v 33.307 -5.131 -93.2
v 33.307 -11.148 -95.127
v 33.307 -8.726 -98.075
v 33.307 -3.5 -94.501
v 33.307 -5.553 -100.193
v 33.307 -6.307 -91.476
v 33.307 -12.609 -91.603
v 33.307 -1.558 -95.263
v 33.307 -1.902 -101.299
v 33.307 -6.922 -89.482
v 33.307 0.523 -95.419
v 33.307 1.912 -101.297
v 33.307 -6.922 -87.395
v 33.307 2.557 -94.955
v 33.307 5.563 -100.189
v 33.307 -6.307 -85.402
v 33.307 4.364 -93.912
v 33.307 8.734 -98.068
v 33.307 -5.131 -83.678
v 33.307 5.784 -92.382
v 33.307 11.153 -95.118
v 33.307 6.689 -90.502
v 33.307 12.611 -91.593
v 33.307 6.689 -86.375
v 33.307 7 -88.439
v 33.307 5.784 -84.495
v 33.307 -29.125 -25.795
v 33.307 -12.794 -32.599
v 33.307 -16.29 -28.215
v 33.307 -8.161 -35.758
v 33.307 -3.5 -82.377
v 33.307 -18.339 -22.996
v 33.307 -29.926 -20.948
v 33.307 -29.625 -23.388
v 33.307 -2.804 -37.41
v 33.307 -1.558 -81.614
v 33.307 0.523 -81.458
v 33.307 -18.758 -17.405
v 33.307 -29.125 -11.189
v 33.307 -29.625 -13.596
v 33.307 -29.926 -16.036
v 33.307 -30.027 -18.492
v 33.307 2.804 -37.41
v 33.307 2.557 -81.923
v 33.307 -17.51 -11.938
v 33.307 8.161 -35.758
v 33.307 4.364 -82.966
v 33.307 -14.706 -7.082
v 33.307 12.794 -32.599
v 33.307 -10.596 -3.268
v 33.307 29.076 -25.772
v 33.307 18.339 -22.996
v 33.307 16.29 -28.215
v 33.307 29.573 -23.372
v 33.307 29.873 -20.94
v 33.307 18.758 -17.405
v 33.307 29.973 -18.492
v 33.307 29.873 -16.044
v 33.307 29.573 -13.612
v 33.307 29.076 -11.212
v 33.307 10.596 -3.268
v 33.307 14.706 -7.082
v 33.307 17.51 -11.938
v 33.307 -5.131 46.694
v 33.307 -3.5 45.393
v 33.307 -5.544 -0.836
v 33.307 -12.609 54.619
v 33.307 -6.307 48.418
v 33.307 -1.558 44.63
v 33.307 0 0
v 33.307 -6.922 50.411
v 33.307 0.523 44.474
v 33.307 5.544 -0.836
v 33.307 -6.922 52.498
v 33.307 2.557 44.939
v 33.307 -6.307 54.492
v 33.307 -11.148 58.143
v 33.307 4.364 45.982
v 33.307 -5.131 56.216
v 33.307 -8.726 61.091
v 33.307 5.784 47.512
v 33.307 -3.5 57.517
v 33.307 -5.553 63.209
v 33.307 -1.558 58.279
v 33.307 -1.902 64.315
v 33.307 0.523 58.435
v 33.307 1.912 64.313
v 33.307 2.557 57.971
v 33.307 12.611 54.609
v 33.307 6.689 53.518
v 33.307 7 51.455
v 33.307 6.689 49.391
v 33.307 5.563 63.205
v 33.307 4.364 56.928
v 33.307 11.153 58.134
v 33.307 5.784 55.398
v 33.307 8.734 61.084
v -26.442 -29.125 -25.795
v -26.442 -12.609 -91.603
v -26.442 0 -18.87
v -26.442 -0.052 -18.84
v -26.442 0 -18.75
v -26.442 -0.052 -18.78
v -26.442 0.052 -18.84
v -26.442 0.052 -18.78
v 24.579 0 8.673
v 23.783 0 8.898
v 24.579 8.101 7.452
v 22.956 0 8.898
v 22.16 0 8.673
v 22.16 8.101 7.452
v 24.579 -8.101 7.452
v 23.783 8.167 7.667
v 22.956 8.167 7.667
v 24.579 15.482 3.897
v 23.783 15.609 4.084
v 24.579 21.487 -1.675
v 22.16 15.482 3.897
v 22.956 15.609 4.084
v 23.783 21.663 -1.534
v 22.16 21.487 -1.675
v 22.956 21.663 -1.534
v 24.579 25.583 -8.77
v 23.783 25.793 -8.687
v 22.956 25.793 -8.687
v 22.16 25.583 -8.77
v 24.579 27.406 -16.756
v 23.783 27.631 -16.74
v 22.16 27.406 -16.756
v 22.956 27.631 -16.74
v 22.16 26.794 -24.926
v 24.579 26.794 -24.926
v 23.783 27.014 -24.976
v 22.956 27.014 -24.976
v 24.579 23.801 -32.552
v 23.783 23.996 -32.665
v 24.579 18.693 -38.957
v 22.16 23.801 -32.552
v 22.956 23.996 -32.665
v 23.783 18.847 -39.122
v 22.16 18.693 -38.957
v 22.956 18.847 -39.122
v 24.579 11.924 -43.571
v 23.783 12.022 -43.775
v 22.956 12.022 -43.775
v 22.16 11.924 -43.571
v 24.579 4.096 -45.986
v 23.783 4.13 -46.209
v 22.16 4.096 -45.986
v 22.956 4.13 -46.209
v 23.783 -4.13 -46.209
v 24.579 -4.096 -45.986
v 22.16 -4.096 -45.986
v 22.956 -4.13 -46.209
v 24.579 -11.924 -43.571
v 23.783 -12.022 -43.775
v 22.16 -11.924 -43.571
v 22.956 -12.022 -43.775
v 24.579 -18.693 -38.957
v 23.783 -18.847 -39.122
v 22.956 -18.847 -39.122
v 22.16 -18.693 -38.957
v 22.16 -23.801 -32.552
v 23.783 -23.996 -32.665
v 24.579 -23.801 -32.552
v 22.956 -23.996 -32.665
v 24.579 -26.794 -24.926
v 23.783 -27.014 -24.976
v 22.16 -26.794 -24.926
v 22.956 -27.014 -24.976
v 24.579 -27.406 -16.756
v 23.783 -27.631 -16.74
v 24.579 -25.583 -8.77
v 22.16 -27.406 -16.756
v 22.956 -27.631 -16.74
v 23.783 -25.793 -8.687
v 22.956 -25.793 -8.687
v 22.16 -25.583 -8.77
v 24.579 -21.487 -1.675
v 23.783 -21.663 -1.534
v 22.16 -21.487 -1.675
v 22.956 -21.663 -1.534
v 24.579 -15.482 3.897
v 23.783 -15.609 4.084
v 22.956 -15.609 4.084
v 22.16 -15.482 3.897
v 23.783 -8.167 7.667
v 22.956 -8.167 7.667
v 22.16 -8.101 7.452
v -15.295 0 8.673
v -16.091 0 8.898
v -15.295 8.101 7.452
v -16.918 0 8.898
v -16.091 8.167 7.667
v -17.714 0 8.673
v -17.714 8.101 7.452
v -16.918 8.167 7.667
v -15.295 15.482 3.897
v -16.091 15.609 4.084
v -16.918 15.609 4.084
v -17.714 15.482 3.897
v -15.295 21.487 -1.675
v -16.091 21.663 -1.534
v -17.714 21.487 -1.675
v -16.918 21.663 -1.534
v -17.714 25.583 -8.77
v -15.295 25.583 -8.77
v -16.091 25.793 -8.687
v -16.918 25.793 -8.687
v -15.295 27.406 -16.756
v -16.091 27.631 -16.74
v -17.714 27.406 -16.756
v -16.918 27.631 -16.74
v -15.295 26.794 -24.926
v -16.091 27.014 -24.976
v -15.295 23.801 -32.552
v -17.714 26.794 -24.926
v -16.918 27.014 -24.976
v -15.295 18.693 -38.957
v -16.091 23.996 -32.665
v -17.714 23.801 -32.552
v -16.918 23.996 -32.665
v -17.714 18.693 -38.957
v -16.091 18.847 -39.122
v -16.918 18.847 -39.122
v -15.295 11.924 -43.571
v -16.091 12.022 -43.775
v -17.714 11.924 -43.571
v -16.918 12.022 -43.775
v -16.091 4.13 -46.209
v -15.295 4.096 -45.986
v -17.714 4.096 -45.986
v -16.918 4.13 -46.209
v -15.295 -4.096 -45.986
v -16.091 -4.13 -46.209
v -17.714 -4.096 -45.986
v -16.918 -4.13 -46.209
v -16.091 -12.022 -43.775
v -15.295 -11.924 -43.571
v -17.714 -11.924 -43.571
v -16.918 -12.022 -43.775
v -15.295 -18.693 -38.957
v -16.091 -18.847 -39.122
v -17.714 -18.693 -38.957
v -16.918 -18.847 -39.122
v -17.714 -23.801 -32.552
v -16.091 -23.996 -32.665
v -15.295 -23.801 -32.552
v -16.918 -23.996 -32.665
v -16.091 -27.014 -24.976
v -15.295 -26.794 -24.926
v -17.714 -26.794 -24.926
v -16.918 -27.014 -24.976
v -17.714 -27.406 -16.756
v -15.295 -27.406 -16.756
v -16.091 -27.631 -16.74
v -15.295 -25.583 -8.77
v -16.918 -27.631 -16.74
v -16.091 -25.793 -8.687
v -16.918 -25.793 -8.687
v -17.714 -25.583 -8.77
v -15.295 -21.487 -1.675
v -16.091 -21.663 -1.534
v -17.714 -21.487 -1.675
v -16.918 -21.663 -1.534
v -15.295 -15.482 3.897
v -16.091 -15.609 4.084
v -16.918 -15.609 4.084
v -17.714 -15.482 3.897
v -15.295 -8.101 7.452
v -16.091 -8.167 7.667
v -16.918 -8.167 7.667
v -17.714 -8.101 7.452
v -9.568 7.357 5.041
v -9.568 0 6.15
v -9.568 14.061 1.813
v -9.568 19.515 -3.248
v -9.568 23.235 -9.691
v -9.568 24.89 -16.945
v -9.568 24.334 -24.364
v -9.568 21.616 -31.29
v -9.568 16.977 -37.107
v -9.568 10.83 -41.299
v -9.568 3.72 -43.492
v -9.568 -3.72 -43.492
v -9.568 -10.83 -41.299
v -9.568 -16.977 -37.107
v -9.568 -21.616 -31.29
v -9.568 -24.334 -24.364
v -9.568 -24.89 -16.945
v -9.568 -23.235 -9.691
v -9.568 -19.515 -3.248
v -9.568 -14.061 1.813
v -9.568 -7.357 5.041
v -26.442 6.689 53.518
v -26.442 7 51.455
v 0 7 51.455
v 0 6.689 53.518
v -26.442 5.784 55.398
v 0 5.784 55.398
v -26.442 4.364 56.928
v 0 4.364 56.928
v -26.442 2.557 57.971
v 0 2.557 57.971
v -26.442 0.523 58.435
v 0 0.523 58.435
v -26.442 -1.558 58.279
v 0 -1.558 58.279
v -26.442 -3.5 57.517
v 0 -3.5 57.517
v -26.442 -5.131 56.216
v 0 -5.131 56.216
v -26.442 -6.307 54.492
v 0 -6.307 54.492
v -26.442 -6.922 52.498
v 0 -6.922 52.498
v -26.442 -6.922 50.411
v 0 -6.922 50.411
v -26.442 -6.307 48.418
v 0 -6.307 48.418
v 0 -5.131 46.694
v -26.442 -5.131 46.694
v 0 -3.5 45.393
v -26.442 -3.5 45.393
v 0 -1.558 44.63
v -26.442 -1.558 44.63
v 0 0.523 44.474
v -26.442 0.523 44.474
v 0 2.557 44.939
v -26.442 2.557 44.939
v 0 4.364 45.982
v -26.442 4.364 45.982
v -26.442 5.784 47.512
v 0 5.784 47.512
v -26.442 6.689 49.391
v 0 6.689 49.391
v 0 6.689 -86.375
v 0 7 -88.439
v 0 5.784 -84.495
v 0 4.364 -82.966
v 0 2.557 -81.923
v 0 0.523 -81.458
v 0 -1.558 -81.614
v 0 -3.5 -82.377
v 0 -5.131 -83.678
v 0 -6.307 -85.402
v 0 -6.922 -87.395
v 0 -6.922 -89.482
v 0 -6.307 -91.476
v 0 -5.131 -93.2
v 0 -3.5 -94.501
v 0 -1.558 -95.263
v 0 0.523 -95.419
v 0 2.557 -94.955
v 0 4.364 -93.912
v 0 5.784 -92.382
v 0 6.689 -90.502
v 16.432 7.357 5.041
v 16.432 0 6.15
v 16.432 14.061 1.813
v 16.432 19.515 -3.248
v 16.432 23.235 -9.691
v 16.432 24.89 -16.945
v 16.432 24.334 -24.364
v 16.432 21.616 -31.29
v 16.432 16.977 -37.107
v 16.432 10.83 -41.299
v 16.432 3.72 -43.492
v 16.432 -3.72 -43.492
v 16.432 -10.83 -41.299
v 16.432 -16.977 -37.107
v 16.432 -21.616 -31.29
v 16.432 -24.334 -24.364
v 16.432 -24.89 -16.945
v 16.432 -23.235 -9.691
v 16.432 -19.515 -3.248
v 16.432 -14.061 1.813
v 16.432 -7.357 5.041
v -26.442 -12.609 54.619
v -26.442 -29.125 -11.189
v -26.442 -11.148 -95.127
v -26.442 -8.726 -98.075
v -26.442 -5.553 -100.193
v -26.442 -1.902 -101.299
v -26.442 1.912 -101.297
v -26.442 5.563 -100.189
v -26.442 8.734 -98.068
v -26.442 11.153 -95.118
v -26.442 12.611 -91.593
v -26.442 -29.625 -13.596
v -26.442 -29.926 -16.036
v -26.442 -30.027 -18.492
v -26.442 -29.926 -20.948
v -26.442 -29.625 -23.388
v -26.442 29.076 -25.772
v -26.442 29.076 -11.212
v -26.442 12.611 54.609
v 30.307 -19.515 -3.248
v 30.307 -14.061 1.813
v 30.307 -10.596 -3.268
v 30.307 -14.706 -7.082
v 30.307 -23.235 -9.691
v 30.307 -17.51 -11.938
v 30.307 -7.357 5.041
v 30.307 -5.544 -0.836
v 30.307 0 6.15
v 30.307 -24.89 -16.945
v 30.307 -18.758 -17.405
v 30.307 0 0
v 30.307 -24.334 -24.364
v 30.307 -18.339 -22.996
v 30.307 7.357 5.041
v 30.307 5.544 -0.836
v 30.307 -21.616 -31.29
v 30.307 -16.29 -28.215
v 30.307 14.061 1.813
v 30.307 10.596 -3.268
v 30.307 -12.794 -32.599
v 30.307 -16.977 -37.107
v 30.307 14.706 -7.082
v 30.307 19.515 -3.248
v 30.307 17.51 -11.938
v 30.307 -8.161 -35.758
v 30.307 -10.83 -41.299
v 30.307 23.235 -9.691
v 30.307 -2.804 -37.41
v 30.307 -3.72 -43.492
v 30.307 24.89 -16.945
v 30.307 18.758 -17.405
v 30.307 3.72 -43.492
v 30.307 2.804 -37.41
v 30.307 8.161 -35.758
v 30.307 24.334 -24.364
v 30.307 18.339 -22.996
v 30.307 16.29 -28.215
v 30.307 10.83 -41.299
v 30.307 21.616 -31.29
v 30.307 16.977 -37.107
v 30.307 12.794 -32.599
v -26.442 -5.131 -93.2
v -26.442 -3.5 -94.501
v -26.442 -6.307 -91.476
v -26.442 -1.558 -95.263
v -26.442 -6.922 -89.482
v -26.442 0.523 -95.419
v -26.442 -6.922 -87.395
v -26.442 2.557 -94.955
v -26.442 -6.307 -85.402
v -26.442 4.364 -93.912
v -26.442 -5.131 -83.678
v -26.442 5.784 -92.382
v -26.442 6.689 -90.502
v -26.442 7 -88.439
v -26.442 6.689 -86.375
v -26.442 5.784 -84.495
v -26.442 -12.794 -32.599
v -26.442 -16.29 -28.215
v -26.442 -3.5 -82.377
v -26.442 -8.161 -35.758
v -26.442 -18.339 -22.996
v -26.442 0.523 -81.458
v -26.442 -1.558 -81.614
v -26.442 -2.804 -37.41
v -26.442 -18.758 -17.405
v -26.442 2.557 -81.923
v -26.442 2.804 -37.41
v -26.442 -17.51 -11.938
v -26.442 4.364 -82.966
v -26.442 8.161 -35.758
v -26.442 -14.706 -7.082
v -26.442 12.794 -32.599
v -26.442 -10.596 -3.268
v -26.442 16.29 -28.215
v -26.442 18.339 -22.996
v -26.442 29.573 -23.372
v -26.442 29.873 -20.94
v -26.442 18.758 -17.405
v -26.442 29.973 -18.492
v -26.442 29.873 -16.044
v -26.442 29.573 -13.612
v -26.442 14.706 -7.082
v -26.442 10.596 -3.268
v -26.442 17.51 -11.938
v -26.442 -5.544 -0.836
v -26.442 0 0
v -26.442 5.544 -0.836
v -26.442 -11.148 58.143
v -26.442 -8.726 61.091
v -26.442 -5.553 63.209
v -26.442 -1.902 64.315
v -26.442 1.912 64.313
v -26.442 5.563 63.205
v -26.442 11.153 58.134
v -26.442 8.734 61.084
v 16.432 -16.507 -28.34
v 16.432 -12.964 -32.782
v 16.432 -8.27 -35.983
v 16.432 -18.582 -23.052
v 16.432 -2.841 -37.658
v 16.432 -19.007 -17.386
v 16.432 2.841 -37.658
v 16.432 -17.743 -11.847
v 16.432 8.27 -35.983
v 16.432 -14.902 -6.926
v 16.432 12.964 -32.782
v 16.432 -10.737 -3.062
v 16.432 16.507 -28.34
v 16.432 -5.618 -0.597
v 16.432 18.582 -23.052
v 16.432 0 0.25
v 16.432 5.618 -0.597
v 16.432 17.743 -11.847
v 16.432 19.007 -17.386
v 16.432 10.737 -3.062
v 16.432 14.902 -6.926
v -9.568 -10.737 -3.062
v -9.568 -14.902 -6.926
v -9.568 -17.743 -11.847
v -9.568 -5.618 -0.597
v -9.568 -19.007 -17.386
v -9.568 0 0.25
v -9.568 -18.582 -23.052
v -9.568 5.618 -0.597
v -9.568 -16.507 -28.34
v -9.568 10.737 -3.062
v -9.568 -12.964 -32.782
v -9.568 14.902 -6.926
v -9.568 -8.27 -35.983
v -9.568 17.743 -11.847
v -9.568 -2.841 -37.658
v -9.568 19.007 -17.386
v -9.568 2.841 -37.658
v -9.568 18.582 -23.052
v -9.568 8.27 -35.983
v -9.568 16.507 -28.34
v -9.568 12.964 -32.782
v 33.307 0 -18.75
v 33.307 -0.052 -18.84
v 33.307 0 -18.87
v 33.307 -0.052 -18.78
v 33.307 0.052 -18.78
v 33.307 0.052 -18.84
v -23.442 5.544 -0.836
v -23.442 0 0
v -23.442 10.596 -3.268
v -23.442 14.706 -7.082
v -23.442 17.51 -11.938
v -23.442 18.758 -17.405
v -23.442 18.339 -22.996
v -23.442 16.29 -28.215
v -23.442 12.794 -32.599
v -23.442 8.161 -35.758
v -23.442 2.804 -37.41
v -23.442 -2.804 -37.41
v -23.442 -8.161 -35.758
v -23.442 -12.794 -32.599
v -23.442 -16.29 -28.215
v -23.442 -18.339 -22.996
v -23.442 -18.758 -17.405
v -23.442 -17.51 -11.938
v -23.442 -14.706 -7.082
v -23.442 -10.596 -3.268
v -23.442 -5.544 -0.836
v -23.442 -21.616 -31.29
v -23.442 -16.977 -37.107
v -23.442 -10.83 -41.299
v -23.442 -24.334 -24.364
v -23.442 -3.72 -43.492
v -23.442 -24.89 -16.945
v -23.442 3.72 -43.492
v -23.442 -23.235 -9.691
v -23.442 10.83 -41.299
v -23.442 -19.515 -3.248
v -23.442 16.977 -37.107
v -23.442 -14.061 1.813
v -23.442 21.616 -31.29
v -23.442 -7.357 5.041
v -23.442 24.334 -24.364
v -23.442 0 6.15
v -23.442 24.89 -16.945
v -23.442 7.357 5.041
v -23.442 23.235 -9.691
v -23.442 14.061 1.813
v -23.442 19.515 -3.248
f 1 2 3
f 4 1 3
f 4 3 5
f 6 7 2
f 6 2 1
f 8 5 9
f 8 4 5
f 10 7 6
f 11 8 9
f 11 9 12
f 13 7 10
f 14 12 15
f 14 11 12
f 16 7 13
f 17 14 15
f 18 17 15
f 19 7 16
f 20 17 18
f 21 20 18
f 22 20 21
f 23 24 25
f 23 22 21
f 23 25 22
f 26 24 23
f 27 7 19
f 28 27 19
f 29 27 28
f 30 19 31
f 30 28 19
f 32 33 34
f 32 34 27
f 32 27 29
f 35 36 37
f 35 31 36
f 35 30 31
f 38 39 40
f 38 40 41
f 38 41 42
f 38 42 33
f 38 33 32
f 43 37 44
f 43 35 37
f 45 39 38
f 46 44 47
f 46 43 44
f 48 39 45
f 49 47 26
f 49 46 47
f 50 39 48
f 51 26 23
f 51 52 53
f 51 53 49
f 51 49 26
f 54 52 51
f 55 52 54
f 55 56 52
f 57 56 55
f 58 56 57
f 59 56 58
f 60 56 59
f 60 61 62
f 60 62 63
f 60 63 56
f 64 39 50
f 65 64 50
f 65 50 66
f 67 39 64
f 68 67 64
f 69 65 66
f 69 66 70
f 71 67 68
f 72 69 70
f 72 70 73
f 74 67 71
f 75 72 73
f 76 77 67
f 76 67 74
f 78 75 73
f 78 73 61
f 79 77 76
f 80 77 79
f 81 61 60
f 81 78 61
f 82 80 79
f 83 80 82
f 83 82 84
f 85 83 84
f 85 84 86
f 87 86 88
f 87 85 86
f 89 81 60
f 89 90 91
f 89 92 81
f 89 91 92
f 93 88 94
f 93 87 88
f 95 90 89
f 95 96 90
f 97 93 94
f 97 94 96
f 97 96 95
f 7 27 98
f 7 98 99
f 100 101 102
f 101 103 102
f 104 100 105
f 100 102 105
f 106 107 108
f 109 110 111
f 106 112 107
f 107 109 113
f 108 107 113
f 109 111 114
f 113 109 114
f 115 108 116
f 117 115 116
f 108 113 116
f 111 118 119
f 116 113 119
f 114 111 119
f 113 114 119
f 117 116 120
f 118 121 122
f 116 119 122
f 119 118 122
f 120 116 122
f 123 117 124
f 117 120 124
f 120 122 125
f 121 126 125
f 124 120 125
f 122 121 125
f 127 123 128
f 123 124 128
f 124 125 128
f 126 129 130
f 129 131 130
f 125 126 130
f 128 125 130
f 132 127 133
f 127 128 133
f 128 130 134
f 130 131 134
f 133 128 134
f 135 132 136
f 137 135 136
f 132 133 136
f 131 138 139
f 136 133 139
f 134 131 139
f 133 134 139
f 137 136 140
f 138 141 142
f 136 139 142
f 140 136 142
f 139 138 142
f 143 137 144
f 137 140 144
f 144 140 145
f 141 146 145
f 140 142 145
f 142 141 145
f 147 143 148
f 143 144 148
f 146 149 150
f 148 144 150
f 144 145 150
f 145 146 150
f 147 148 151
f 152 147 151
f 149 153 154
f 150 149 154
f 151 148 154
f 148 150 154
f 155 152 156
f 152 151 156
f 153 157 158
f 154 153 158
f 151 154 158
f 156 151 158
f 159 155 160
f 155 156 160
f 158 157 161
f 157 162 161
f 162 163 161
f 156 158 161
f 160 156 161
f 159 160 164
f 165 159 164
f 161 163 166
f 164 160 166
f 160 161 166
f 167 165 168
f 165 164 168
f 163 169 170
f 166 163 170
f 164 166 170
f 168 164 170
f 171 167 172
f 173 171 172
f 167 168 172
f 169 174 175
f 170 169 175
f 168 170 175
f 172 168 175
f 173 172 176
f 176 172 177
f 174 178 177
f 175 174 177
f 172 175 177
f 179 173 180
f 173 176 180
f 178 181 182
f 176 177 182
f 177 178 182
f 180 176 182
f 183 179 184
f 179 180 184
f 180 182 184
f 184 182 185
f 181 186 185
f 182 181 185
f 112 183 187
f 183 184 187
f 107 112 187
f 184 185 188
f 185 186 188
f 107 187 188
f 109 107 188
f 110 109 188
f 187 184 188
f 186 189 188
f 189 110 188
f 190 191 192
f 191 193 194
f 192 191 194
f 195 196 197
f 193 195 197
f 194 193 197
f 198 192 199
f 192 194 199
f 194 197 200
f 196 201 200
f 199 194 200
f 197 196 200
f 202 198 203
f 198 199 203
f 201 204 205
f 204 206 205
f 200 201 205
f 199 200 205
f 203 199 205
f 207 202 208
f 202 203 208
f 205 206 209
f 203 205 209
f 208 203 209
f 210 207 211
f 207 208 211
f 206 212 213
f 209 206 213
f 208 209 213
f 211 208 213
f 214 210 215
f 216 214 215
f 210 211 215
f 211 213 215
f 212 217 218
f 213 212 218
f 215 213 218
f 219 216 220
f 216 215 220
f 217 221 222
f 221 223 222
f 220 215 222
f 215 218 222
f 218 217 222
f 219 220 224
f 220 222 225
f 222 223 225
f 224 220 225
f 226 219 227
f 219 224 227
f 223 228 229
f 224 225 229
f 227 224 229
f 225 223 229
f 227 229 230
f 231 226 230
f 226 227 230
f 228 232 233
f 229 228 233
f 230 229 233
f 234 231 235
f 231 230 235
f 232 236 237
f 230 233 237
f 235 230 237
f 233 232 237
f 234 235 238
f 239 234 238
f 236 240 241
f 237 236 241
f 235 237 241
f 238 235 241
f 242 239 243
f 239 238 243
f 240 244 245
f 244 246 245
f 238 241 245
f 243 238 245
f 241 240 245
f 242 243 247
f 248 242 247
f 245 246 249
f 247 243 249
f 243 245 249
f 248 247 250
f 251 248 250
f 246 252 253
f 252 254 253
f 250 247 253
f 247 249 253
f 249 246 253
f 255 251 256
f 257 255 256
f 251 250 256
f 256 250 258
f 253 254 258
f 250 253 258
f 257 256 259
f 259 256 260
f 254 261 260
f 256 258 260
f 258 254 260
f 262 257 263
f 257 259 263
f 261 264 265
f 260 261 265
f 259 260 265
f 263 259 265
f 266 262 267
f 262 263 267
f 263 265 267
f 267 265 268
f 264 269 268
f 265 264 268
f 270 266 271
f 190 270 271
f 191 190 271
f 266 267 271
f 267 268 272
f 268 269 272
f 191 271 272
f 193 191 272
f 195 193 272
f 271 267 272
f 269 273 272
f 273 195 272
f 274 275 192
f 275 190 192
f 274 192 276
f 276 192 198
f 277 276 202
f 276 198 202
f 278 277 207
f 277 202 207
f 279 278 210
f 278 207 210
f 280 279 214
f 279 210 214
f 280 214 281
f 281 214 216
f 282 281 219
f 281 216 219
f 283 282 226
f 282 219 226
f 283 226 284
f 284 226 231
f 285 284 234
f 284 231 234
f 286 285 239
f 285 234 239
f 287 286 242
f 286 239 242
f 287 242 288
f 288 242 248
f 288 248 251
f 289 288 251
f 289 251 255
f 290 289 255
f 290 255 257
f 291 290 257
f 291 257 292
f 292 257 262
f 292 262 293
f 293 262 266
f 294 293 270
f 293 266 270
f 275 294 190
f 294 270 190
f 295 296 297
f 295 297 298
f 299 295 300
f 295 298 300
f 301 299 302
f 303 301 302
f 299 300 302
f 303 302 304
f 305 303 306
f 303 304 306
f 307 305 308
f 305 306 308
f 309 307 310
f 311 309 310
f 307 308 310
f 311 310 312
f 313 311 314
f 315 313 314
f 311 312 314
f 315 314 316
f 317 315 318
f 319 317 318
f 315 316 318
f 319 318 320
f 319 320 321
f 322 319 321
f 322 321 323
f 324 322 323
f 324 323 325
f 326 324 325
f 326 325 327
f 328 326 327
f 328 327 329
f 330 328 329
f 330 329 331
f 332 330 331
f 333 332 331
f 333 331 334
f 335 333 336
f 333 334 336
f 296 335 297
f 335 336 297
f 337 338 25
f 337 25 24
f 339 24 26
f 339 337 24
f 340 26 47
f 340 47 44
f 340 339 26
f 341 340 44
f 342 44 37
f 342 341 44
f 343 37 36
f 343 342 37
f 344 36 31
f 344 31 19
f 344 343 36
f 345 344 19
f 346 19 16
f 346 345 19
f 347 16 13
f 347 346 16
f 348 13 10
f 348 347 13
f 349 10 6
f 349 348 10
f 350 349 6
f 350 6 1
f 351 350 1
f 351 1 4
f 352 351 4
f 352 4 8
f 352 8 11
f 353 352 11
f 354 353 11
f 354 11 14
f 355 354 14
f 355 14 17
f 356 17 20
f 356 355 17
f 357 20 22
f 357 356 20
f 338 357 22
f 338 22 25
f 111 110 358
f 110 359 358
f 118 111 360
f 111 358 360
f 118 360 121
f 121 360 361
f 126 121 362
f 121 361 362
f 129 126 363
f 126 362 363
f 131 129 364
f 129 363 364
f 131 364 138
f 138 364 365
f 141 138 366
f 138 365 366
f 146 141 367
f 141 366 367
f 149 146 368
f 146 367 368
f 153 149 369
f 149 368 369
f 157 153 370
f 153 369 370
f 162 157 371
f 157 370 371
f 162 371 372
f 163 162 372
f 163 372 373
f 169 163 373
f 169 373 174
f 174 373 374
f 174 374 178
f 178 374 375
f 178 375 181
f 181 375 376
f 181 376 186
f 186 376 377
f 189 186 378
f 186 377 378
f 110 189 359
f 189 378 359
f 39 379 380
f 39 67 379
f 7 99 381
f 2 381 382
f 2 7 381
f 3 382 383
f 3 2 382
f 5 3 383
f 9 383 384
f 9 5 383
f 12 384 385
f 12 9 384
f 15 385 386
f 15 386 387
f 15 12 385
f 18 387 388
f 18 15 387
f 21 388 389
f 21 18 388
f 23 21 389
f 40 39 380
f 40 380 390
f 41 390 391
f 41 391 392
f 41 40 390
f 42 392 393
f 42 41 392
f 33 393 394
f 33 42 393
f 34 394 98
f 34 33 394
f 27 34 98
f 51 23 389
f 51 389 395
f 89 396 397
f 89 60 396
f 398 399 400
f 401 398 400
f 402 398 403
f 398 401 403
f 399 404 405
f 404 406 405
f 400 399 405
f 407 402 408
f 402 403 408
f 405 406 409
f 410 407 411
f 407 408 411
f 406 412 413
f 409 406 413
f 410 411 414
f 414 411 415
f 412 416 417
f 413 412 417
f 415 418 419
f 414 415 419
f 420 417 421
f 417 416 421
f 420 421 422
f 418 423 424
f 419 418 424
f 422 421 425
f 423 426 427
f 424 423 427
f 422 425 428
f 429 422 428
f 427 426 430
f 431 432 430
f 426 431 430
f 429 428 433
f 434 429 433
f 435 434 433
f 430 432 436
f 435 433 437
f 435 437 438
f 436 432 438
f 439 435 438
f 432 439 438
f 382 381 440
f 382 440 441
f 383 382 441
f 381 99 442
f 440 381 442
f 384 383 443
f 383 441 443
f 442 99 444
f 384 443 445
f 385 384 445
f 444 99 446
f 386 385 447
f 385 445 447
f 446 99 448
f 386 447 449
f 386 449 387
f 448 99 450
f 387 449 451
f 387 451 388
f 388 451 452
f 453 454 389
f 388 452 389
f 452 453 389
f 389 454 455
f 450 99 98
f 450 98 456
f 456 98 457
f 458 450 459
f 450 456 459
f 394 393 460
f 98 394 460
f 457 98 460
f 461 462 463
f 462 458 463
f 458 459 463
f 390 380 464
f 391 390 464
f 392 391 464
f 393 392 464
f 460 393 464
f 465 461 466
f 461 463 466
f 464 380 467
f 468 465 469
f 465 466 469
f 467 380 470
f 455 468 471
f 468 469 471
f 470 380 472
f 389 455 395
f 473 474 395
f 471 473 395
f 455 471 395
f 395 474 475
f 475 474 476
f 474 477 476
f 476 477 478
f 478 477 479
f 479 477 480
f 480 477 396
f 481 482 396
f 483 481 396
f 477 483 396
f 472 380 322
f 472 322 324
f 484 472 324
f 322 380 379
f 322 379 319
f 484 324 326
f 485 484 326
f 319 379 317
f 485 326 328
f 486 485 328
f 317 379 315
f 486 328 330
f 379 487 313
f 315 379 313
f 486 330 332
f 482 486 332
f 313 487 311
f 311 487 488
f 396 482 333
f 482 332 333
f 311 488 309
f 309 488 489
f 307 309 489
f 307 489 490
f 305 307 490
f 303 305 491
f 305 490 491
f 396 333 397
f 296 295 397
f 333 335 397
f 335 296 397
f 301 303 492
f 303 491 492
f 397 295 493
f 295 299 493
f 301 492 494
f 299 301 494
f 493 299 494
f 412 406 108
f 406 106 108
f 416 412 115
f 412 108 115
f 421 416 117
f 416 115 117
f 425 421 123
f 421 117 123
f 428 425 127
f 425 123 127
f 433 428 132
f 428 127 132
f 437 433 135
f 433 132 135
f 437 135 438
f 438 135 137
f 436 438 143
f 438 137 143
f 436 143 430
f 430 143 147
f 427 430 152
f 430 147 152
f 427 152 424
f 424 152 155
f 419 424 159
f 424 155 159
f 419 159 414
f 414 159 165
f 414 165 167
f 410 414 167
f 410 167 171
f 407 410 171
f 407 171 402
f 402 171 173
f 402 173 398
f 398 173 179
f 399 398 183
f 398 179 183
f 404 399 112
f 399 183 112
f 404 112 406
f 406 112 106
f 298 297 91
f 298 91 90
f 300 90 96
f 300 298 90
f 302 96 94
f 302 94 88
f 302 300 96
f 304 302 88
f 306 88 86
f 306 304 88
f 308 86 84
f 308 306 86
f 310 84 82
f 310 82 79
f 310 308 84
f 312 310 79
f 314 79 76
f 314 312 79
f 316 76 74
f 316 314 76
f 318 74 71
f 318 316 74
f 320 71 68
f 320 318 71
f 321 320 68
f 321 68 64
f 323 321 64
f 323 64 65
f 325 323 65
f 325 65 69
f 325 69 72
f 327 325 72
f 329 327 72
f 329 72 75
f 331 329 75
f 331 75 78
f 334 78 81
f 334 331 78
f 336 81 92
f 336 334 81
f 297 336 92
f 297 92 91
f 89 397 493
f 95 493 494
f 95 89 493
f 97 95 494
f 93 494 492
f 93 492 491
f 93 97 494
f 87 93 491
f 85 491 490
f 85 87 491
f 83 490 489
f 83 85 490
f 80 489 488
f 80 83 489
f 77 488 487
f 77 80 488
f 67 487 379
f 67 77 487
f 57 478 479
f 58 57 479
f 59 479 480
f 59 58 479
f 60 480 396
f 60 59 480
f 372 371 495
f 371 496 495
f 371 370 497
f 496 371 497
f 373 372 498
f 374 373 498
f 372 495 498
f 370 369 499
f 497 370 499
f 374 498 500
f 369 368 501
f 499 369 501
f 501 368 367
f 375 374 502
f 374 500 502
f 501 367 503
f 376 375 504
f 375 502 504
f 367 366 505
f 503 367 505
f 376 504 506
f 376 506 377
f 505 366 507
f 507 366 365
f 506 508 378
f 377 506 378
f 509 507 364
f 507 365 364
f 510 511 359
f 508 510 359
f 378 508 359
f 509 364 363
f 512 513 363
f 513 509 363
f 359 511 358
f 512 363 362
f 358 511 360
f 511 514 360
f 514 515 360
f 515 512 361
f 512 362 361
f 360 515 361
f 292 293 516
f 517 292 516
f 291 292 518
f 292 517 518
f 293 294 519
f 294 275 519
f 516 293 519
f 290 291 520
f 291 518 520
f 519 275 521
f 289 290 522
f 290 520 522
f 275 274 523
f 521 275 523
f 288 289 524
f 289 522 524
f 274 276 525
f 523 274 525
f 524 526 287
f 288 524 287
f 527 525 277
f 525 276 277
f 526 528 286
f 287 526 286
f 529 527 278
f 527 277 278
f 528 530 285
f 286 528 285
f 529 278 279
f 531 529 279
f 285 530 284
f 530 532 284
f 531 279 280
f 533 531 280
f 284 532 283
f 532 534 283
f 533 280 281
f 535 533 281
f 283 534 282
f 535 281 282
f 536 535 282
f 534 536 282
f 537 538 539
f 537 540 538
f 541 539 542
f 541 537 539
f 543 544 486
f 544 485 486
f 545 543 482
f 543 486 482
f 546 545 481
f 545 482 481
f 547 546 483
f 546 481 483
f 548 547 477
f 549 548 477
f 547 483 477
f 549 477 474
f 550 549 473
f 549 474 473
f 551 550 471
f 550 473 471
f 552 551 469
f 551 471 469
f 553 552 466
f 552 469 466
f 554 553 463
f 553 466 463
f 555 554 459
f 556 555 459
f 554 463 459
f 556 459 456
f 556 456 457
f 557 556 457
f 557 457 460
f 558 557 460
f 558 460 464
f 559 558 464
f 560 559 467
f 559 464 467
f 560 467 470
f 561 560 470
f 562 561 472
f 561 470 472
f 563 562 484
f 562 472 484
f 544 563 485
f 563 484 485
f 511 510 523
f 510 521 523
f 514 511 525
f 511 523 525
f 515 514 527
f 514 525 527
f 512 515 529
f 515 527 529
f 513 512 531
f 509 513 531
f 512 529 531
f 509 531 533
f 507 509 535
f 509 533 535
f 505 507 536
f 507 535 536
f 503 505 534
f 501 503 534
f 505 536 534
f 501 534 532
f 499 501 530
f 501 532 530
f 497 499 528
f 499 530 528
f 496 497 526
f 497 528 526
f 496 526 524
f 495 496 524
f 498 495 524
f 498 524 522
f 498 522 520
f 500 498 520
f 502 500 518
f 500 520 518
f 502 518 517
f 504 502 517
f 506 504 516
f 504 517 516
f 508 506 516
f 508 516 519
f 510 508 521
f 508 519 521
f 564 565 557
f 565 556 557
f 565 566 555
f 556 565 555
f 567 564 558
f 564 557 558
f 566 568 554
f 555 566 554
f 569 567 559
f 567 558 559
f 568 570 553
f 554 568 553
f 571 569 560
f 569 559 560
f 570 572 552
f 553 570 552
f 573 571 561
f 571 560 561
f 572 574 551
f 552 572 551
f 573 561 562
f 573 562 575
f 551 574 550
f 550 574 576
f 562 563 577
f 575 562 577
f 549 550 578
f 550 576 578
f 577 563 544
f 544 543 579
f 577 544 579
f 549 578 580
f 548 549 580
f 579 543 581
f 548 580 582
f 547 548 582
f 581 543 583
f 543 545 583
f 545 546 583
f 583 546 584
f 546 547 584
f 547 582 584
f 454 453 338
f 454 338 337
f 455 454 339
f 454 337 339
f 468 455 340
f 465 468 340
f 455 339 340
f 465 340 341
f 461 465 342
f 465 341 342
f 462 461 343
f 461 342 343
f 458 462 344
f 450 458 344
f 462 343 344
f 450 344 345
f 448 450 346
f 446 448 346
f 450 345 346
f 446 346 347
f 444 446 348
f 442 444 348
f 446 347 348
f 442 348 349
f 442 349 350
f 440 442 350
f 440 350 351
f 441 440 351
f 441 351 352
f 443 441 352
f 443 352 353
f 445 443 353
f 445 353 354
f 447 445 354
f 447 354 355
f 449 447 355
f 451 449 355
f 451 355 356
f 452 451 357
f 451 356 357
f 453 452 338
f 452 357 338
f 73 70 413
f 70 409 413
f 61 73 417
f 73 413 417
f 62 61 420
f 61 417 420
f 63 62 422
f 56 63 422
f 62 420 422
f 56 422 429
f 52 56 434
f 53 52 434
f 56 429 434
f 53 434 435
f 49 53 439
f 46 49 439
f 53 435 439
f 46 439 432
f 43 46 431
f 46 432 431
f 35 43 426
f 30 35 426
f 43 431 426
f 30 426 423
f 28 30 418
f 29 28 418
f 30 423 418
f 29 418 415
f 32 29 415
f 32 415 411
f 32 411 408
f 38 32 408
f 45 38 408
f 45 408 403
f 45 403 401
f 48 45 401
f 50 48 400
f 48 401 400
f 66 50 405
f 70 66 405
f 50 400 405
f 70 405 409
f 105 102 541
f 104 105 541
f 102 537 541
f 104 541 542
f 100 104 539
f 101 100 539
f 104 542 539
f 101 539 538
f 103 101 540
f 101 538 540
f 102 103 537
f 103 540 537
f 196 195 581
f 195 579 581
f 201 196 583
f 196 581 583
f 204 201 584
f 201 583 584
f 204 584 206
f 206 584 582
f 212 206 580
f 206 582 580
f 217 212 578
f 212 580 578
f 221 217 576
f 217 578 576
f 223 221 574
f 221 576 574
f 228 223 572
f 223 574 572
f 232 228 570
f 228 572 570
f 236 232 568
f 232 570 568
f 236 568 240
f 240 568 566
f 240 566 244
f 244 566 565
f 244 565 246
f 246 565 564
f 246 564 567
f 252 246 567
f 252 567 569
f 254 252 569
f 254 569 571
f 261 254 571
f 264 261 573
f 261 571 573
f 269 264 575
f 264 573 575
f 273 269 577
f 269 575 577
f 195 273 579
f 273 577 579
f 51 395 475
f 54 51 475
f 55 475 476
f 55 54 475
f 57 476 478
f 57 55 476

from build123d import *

# Parameters (mm, degrees)
F2_R          = 7
F4_DEPTH      = 33.3065602455
F4_DEPTH_BACK = 26.4416433064


with BuildPart() as f3:
    # F0 (on Front) → F3 (revolve)
    with BuildSketch(Plane.XZ):
        with BuildLine():
            Line((-23.4416433064, 0), (-26.4416433064, 0))
            Line((-26.4416433064, 0), (-26.4416433064, -18.75))
            Line((-26.4416433064, -18.75), (33.3065602455, -18.75))
            Line((33.3065602455, -18.75), (33.3065602455, 0))
            Line((33.3065602455, 0), (30.3065602455, 0))
            Line((30.3065602455, 0), (30.3065602455, 6.15))
            Line((30.3065602455, 6.15), (24.5786576005, 8.6725991642))
            ThreePointArc((24.5786576005, 8.6725991642), (23.3695093576, 8.927064512), (22.1603611146, 8.6725991642))
            Line((22.1603611146, 8.6725991642), (16.4324584696, 6.15))
            Line((16.4324584696, 6.15), (16.4324584696, 0.25))
            Line((16.4324584696, 0.25), (3.4324584696, 0.25))
            Line((3.4324584696, 0.25), (-9.5675415304, 0.25))
            Line((-9.5675415304, 0.25), (-9.5675415304, 6.15))
            Line((-9.5675415304, 6.15), (-15.2954441754, 8.6725991642))
            ThreePointArc((-15.2954441754, 8.6725991642), (-16.5045924184, 8.927064512), (-17.7137406613, 8.6725991642))
            Line((-17.7137406613, 8.6725991642), (-23.4416433064, 6.15))
            Line((-23.4416433064, 6.15), (-23.4416433064, 0))
        make_face()
    revolve(axis=Axis((2.1554362029, 0, -18.8102256507), (-1, 0, 0)))


with BuildPart() as f4:
    # F2 (on Right) → F4 (new body, two sides)
    with BuildSketch(Plane.YZ) as f4_sk:
        with BuildLine():
            Line((-12.6089768233, 54.6192074868), (-29.1248044555, -11.1894187234))
            ThreePointArc((-29.1248044555, -11.1894187234), (-29.8007207167, -14.8129297506), (-30.0271656326, -18.4919809402))
            Line((-30.0271656326, -18.4919809402), (29.9728343674, -18.4919809402))
            ThreePointArc((29.9728343674, -18.4919809402), (29.7478160608, -14.8244933595), (29.0761366904, -11.2120225685))
            Line((29.0761366904, -11.2120225685), (12.6114310066, 54.6094124873))
            ThreePointArc((12.6114310066, 54.6094124873), (0.0050488868, 64.4547628791), (-12.6089768233, 54.6192074868))
        make_face()
        with Locations((0, 51.4547638595)):
            Circle(F2_R, mode=Mode.SUBTRACT)
        with BuildLine():
            Line((29.9728343674, -18.4919809402), (-30.0271656326, -18.4919809402))
            ThreePointArc((-30.0271656326, -18.4919809402), (-29.8007207167, -22.1710321299), (-29.1248044555, -25.7945431571))
            Line((-29.1248044555, -25.7945431571), (-12.6089768233, -91.6031693673))
            ThreePointArc((-12.6089768233, -91.6031693673), (0.0050488868, -101.4387247595), (12.6114310066, -91.5933743677))
            Line((12.6114310066, -91.5933743677), (29.0761366904, -25.771939312))
            ThreePointArc((29.0761366904, -25.771939312), (29.7478160608, -22.1594685209), (29.9728343674, -18.4919809402))
        make_face()
        with Locations((0, -88.43872574)):
            Circle(F2_R, mode=Mode.SUBTRACT)
    extrude(amount=F4_DEPTH)
    extrude(f4_sk.sketch, amount=-F4_DEPTH_BACK)

    # F5: cut F3
    add(f3.part, mode=Mode.SUBTRACT)


solid = f4.part
